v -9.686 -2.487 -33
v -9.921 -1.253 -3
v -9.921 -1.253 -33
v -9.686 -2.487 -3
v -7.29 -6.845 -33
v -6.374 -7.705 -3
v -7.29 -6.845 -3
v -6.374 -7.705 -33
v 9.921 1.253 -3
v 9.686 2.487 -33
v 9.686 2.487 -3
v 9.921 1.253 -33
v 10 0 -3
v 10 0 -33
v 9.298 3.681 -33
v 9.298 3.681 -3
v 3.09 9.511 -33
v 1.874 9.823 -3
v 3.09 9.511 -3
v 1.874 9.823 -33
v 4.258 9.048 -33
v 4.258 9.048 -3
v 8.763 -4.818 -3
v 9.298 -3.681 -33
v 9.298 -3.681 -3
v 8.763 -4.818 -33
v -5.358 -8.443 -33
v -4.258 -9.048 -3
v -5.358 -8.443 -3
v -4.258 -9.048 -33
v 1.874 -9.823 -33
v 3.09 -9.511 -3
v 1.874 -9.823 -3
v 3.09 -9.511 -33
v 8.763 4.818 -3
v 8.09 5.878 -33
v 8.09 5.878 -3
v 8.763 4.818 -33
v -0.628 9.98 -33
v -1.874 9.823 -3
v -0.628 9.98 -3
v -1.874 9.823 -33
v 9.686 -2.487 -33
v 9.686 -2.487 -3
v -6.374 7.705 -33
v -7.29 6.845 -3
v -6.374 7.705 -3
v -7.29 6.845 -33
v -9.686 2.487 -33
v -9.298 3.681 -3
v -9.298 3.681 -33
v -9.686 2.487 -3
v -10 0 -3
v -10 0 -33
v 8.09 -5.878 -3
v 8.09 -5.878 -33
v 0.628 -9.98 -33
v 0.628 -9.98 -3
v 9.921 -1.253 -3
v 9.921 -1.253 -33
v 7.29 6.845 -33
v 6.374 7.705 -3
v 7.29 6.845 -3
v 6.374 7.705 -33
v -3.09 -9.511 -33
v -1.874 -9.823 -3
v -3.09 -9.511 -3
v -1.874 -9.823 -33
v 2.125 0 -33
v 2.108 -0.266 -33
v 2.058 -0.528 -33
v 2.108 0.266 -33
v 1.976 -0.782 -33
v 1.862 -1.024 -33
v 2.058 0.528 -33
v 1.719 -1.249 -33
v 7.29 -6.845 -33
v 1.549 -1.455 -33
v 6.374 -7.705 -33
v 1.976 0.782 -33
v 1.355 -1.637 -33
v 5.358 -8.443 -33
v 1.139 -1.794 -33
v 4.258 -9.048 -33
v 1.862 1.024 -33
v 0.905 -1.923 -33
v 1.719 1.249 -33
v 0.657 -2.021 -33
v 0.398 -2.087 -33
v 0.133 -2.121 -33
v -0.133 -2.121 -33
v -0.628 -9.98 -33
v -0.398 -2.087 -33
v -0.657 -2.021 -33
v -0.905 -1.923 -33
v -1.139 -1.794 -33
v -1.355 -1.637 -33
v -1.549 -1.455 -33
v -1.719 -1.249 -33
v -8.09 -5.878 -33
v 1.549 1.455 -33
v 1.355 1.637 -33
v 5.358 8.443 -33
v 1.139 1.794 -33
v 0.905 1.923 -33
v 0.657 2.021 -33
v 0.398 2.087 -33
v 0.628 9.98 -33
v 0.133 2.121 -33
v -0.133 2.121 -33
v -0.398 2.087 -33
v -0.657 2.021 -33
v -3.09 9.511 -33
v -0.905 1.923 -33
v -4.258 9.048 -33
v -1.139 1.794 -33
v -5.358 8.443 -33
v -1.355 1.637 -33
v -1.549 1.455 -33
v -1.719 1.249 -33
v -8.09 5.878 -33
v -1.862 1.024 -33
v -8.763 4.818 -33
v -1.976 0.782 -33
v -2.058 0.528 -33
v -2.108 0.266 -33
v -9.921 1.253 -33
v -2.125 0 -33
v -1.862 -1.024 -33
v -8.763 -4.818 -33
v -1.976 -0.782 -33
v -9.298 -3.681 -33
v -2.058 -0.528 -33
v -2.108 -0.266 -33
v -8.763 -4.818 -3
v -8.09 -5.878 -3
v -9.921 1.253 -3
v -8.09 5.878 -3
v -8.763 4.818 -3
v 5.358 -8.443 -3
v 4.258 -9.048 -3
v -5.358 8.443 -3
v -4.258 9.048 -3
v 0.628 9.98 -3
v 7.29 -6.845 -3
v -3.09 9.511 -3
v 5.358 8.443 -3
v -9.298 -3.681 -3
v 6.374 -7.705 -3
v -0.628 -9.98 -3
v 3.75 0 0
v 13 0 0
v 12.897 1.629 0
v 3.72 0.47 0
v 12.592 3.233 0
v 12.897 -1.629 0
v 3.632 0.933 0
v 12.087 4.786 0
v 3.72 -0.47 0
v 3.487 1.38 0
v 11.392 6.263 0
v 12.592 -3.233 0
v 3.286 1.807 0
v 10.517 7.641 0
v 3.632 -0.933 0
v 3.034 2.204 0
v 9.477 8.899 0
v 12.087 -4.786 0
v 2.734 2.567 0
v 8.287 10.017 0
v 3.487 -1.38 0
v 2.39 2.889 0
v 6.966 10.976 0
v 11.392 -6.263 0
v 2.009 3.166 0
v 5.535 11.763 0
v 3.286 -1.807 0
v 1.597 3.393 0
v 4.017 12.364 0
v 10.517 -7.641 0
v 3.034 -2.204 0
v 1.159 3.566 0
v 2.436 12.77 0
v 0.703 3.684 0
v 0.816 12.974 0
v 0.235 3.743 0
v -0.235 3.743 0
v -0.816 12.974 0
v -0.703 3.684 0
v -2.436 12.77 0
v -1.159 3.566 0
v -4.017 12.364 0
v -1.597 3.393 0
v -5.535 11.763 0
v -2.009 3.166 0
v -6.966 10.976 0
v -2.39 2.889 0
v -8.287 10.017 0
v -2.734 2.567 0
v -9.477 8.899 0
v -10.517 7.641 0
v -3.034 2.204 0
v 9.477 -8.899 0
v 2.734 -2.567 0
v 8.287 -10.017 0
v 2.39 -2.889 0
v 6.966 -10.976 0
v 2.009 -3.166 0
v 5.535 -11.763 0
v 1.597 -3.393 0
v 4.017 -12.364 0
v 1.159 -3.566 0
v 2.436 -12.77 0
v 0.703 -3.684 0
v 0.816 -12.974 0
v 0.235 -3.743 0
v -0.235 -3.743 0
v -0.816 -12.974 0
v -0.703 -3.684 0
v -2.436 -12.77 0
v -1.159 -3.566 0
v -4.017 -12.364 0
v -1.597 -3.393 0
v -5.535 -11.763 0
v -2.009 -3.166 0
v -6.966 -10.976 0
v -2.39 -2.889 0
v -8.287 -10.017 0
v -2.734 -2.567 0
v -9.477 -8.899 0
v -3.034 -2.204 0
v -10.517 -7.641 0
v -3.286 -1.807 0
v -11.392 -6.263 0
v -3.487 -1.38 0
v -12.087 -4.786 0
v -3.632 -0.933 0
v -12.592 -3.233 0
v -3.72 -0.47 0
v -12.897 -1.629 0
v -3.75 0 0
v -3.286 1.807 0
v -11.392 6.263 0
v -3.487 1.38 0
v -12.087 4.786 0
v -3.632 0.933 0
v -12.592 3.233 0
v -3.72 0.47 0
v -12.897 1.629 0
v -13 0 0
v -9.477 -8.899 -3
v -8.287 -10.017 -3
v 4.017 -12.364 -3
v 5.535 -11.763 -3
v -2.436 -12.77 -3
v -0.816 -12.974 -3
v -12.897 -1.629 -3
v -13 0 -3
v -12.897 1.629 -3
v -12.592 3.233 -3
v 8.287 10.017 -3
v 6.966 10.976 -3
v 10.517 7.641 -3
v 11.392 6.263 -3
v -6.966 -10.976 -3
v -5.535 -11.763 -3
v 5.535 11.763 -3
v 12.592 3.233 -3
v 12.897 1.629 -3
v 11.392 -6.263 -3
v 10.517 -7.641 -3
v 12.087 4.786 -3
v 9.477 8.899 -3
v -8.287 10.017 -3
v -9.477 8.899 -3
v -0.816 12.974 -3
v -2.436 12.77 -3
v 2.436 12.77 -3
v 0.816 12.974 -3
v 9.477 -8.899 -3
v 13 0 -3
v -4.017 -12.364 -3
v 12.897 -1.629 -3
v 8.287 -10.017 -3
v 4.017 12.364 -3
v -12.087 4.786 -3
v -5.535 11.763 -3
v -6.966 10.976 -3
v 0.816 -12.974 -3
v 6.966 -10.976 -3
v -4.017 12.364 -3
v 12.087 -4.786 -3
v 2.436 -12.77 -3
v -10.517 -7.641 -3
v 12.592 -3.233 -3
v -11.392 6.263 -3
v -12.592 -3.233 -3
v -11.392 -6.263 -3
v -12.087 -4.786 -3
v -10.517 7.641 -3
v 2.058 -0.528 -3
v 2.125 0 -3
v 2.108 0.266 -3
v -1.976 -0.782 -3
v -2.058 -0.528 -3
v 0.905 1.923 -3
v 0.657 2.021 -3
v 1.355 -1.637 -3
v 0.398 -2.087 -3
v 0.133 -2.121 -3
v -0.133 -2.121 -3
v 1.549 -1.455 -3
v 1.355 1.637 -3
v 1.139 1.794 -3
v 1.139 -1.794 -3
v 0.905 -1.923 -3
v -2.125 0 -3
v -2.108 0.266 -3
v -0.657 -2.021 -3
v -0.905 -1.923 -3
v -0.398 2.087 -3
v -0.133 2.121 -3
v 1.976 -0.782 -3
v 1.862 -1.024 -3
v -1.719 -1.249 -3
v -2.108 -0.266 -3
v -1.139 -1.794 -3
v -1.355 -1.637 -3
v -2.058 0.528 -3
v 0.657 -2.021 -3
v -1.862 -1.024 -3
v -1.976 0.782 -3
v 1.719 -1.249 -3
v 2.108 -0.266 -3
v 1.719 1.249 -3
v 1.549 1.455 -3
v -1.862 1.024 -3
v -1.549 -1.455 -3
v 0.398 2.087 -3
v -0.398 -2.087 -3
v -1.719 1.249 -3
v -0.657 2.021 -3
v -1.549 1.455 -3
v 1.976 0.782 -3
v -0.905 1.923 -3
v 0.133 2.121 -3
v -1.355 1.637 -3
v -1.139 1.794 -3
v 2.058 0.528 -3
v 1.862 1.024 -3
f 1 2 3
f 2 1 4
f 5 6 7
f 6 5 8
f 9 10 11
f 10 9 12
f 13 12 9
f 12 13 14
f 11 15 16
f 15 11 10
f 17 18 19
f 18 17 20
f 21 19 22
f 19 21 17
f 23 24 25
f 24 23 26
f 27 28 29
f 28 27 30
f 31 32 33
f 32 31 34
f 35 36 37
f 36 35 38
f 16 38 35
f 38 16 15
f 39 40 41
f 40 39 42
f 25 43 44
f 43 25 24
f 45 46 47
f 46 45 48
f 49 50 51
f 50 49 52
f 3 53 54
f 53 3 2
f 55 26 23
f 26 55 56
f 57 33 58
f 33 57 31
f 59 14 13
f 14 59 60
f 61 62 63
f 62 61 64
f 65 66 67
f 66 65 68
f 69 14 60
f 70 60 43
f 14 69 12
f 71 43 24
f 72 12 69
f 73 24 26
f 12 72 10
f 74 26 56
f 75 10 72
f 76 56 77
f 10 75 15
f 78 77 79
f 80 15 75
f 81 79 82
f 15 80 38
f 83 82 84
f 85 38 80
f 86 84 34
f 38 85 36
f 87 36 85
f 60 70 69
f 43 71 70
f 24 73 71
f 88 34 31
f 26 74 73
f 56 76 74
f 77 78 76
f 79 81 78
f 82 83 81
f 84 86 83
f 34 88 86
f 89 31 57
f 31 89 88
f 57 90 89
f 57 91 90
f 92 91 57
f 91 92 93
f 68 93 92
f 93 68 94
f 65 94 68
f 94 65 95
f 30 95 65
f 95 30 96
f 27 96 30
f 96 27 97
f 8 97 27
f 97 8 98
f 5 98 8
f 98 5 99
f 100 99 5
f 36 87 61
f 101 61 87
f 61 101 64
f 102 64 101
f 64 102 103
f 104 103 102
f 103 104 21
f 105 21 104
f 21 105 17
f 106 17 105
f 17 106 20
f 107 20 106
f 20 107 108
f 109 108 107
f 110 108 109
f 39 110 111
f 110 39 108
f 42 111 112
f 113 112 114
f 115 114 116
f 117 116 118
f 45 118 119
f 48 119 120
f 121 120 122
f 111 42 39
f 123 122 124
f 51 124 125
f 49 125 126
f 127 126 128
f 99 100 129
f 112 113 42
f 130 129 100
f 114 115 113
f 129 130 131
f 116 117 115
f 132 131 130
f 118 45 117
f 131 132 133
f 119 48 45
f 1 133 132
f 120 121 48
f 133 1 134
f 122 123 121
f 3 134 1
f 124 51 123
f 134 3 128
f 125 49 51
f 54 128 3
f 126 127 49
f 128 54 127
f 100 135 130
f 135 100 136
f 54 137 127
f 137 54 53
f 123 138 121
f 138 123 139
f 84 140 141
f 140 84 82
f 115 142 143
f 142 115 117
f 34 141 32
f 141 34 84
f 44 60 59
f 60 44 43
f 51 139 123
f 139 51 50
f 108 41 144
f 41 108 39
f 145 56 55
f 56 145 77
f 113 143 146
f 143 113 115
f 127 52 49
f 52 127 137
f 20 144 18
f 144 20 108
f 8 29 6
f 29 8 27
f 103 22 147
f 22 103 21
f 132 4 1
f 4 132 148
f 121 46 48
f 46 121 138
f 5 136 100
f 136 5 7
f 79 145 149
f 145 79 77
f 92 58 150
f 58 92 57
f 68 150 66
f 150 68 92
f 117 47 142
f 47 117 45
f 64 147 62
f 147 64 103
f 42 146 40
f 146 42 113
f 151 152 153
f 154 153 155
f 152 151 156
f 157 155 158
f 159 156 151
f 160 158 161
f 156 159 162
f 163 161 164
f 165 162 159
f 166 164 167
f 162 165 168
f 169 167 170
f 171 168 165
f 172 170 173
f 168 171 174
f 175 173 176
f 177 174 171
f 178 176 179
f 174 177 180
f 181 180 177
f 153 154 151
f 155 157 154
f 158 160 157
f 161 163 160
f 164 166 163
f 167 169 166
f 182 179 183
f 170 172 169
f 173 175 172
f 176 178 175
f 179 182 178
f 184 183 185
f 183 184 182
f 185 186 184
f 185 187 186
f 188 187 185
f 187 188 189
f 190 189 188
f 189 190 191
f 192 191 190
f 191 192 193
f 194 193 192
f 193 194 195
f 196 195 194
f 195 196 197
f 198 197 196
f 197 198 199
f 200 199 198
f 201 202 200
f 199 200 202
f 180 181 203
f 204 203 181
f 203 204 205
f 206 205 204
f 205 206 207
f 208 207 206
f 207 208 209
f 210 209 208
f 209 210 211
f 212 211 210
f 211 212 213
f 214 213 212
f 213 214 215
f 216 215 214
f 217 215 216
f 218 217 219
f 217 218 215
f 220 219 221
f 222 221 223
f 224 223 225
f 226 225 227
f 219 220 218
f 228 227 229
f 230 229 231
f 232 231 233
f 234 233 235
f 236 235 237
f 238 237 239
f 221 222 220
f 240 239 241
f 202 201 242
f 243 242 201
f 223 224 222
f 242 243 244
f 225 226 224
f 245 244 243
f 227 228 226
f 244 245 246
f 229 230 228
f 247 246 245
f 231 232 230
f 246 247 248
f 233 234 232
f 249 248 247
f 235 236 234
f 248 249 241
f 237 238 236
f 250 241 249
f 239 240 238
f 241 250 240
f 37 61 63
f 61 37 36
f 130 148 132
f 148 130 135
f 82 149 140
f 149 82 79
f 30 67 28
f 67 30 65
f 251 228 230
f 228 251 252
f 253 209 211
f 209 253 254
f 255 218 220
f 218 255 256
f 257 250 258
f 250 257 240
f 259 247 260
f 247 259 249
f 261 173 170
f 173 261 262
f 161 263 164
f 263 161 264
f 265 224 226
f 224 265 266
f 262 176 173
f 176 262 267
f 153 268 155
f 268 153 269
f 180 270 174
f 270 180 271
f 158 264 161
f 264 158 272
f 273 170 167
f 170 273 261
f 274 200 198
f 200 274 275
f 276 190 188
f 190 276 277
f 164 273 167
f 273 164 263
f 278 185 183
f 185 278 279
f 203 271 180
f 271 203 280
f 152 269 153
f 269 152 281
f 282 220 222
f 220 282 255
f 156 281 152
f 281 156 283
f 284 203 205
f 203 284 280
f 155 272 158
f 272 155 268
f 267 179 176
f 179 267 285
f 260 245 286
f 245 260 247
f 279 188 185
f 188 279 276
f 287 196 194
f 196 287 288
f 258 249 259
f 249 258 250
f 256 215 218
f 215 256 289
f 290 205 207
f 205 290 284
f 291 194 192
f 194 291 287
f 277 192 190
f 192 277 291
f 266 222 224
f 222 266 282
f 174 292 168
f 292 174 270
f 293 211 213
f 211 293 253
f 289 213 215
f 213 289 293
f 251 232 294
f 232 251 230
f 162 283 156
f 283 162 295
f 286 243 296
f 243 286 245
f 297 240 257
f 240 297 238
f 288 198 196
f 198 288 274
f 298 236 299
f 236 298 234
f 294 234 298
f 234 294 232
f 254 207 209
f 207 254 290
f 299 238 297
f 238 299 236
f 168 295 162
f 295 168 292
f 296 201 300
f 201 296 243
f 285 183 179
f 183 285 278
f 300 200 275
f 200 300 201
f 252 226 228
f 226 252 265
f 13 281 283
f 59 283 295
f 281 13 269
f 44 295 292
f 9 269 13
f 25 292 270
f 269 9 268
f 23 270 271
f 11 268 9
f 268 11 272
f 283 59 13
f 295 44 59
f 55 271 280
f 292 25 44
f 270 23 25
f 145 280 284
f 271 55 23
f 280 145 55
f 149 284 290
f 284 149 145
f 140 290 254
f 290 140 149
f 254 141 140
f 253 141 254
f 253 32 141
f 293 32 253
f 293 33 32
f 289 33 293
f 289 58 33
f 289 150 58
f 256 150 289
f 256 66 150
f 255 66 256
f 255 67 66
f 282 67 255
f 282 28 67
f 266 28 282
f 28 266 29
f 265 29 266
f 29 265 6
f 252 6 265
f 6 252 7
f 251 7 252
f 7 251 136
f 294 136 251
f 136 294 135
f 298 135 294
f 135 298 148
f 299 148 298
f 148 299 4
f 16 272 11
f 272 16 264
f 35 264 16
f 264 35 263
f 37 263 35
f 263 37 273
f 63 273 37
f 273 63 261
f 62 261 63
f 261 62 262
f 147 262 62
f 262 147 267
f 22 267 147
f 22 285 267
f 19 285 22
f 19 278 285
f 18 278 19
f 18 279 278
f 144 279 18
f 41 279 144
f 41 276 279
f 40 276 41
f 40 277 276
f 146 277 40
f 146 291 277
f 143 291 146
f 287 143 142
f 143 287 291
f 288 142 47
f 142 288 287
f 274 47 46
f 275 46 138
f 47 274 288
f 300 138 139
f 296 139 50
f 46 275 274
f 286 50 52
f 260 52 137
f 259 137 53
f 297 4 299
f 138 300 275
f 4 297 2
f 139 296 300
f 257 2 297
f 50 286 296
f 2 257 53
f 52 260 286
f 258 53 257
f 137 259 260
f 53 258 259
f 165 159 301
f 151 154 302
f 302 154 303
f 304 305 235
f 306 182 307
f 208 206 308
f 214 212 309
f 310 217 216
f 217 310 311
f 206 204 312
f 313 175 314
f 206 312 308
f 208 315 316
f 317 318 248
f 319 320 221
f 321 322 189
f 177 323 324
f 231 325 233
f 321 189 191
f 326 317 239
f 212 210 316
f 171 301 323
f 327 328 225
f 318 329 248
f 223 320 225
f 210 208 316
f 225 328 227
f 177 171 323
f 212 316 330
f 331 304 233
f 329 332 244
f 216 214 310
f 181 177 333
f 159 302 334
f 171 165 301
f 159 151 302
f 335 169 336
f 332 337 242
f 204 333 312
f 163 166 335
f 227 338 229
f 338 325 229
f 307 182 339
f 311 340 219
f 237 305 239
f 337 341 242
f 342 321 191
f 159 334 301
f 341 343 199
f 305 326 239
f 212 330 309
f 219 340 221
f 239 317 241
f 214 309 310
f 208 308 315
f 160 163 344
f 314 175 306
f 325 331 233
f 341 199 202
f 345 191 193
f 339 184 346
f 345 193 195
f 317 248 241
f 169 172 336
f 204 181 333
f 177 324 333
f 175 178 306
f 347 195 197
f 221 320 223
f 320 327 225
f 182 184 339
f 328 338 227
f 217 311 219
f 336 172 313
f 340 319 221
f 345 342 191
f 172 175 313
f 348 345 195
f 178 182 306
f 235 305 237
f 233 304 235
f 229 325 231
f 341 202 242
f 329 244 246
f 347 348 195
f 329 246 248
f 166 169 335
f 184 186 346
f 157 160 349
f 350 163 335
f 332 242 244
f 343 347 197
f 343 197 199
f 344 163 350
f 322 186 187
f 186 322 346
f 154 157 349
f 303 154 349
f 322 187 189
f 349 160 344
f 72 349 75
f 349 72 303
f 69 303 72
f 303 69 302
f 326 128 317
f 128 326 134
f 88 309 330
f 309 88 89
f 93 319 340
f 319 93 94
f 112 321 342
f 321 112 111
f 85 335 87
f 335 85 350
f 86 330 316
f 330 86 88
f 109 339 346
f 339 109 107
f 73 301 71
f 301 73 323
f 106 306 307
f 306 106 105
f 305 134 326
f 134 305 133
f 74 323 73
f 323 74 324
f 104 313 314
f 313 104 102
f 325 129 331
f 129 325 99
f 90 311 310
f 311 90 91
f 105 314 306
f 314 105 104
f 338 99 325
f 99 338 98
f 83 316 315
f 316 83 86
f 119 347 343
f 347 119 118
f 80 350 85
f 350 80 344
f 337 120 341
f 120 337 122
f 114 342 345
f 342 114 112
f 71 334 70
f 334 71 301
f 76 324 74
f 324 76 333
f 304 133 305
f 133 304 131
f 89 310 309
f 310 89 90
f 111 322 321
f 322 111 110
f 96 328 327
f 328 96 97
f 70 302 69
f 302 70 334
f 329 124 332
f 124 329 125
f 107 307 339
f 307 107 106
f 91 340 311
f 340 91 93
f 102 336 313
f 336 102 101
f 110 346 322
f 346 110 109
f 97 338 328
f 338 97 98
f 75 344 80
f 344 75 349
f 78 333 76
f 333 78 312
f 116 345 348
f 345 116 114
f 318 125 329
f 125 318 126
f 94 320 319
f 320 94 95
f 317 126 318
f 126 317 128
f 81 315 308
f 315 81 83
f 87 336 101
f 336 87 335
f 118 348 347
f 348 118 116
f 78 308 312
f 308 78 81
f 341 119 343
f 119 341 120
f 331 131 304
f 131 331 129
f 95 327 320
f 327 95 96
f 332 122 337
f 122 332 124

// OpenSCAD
$fn = 50;


difference() {
	union() {
		translate(v = [0, 0, -33.0000000000]) {
			cylinder(h = 33, r = 10.0000000000);
		}
		translate(v = [0, 0, -3.0000000000]) {
			cylinder(h = 3, r = 13.0000000000);
		}
	}
	union() {
		translate(v = [0, 0, 0]) {
			rotate(a = [0, 0, 0]) {
				difference() {
					union() {
						#translate(v = [0, 0, -33.0000000000]) {
							cylinder(h = 33, r = 2.0000000000);
						}
						#translate(v = [0, 0, -3]) {
							cylinder(h = 3, r = 10.0000000000, r1 = 2.1250000000, r2 = 3.7500000000);
						}
						#translate(v = [0, 0, -33.0000000000]) {
							cylinder(h = 33, r = 2.1250000000);
						}
						#translate(v = [0, 0, -33.0000000000]) {
							cylinder(h = 33, r = 2.0000000000);
						}
					}
					union();
				}
			}
		}
	}
}
